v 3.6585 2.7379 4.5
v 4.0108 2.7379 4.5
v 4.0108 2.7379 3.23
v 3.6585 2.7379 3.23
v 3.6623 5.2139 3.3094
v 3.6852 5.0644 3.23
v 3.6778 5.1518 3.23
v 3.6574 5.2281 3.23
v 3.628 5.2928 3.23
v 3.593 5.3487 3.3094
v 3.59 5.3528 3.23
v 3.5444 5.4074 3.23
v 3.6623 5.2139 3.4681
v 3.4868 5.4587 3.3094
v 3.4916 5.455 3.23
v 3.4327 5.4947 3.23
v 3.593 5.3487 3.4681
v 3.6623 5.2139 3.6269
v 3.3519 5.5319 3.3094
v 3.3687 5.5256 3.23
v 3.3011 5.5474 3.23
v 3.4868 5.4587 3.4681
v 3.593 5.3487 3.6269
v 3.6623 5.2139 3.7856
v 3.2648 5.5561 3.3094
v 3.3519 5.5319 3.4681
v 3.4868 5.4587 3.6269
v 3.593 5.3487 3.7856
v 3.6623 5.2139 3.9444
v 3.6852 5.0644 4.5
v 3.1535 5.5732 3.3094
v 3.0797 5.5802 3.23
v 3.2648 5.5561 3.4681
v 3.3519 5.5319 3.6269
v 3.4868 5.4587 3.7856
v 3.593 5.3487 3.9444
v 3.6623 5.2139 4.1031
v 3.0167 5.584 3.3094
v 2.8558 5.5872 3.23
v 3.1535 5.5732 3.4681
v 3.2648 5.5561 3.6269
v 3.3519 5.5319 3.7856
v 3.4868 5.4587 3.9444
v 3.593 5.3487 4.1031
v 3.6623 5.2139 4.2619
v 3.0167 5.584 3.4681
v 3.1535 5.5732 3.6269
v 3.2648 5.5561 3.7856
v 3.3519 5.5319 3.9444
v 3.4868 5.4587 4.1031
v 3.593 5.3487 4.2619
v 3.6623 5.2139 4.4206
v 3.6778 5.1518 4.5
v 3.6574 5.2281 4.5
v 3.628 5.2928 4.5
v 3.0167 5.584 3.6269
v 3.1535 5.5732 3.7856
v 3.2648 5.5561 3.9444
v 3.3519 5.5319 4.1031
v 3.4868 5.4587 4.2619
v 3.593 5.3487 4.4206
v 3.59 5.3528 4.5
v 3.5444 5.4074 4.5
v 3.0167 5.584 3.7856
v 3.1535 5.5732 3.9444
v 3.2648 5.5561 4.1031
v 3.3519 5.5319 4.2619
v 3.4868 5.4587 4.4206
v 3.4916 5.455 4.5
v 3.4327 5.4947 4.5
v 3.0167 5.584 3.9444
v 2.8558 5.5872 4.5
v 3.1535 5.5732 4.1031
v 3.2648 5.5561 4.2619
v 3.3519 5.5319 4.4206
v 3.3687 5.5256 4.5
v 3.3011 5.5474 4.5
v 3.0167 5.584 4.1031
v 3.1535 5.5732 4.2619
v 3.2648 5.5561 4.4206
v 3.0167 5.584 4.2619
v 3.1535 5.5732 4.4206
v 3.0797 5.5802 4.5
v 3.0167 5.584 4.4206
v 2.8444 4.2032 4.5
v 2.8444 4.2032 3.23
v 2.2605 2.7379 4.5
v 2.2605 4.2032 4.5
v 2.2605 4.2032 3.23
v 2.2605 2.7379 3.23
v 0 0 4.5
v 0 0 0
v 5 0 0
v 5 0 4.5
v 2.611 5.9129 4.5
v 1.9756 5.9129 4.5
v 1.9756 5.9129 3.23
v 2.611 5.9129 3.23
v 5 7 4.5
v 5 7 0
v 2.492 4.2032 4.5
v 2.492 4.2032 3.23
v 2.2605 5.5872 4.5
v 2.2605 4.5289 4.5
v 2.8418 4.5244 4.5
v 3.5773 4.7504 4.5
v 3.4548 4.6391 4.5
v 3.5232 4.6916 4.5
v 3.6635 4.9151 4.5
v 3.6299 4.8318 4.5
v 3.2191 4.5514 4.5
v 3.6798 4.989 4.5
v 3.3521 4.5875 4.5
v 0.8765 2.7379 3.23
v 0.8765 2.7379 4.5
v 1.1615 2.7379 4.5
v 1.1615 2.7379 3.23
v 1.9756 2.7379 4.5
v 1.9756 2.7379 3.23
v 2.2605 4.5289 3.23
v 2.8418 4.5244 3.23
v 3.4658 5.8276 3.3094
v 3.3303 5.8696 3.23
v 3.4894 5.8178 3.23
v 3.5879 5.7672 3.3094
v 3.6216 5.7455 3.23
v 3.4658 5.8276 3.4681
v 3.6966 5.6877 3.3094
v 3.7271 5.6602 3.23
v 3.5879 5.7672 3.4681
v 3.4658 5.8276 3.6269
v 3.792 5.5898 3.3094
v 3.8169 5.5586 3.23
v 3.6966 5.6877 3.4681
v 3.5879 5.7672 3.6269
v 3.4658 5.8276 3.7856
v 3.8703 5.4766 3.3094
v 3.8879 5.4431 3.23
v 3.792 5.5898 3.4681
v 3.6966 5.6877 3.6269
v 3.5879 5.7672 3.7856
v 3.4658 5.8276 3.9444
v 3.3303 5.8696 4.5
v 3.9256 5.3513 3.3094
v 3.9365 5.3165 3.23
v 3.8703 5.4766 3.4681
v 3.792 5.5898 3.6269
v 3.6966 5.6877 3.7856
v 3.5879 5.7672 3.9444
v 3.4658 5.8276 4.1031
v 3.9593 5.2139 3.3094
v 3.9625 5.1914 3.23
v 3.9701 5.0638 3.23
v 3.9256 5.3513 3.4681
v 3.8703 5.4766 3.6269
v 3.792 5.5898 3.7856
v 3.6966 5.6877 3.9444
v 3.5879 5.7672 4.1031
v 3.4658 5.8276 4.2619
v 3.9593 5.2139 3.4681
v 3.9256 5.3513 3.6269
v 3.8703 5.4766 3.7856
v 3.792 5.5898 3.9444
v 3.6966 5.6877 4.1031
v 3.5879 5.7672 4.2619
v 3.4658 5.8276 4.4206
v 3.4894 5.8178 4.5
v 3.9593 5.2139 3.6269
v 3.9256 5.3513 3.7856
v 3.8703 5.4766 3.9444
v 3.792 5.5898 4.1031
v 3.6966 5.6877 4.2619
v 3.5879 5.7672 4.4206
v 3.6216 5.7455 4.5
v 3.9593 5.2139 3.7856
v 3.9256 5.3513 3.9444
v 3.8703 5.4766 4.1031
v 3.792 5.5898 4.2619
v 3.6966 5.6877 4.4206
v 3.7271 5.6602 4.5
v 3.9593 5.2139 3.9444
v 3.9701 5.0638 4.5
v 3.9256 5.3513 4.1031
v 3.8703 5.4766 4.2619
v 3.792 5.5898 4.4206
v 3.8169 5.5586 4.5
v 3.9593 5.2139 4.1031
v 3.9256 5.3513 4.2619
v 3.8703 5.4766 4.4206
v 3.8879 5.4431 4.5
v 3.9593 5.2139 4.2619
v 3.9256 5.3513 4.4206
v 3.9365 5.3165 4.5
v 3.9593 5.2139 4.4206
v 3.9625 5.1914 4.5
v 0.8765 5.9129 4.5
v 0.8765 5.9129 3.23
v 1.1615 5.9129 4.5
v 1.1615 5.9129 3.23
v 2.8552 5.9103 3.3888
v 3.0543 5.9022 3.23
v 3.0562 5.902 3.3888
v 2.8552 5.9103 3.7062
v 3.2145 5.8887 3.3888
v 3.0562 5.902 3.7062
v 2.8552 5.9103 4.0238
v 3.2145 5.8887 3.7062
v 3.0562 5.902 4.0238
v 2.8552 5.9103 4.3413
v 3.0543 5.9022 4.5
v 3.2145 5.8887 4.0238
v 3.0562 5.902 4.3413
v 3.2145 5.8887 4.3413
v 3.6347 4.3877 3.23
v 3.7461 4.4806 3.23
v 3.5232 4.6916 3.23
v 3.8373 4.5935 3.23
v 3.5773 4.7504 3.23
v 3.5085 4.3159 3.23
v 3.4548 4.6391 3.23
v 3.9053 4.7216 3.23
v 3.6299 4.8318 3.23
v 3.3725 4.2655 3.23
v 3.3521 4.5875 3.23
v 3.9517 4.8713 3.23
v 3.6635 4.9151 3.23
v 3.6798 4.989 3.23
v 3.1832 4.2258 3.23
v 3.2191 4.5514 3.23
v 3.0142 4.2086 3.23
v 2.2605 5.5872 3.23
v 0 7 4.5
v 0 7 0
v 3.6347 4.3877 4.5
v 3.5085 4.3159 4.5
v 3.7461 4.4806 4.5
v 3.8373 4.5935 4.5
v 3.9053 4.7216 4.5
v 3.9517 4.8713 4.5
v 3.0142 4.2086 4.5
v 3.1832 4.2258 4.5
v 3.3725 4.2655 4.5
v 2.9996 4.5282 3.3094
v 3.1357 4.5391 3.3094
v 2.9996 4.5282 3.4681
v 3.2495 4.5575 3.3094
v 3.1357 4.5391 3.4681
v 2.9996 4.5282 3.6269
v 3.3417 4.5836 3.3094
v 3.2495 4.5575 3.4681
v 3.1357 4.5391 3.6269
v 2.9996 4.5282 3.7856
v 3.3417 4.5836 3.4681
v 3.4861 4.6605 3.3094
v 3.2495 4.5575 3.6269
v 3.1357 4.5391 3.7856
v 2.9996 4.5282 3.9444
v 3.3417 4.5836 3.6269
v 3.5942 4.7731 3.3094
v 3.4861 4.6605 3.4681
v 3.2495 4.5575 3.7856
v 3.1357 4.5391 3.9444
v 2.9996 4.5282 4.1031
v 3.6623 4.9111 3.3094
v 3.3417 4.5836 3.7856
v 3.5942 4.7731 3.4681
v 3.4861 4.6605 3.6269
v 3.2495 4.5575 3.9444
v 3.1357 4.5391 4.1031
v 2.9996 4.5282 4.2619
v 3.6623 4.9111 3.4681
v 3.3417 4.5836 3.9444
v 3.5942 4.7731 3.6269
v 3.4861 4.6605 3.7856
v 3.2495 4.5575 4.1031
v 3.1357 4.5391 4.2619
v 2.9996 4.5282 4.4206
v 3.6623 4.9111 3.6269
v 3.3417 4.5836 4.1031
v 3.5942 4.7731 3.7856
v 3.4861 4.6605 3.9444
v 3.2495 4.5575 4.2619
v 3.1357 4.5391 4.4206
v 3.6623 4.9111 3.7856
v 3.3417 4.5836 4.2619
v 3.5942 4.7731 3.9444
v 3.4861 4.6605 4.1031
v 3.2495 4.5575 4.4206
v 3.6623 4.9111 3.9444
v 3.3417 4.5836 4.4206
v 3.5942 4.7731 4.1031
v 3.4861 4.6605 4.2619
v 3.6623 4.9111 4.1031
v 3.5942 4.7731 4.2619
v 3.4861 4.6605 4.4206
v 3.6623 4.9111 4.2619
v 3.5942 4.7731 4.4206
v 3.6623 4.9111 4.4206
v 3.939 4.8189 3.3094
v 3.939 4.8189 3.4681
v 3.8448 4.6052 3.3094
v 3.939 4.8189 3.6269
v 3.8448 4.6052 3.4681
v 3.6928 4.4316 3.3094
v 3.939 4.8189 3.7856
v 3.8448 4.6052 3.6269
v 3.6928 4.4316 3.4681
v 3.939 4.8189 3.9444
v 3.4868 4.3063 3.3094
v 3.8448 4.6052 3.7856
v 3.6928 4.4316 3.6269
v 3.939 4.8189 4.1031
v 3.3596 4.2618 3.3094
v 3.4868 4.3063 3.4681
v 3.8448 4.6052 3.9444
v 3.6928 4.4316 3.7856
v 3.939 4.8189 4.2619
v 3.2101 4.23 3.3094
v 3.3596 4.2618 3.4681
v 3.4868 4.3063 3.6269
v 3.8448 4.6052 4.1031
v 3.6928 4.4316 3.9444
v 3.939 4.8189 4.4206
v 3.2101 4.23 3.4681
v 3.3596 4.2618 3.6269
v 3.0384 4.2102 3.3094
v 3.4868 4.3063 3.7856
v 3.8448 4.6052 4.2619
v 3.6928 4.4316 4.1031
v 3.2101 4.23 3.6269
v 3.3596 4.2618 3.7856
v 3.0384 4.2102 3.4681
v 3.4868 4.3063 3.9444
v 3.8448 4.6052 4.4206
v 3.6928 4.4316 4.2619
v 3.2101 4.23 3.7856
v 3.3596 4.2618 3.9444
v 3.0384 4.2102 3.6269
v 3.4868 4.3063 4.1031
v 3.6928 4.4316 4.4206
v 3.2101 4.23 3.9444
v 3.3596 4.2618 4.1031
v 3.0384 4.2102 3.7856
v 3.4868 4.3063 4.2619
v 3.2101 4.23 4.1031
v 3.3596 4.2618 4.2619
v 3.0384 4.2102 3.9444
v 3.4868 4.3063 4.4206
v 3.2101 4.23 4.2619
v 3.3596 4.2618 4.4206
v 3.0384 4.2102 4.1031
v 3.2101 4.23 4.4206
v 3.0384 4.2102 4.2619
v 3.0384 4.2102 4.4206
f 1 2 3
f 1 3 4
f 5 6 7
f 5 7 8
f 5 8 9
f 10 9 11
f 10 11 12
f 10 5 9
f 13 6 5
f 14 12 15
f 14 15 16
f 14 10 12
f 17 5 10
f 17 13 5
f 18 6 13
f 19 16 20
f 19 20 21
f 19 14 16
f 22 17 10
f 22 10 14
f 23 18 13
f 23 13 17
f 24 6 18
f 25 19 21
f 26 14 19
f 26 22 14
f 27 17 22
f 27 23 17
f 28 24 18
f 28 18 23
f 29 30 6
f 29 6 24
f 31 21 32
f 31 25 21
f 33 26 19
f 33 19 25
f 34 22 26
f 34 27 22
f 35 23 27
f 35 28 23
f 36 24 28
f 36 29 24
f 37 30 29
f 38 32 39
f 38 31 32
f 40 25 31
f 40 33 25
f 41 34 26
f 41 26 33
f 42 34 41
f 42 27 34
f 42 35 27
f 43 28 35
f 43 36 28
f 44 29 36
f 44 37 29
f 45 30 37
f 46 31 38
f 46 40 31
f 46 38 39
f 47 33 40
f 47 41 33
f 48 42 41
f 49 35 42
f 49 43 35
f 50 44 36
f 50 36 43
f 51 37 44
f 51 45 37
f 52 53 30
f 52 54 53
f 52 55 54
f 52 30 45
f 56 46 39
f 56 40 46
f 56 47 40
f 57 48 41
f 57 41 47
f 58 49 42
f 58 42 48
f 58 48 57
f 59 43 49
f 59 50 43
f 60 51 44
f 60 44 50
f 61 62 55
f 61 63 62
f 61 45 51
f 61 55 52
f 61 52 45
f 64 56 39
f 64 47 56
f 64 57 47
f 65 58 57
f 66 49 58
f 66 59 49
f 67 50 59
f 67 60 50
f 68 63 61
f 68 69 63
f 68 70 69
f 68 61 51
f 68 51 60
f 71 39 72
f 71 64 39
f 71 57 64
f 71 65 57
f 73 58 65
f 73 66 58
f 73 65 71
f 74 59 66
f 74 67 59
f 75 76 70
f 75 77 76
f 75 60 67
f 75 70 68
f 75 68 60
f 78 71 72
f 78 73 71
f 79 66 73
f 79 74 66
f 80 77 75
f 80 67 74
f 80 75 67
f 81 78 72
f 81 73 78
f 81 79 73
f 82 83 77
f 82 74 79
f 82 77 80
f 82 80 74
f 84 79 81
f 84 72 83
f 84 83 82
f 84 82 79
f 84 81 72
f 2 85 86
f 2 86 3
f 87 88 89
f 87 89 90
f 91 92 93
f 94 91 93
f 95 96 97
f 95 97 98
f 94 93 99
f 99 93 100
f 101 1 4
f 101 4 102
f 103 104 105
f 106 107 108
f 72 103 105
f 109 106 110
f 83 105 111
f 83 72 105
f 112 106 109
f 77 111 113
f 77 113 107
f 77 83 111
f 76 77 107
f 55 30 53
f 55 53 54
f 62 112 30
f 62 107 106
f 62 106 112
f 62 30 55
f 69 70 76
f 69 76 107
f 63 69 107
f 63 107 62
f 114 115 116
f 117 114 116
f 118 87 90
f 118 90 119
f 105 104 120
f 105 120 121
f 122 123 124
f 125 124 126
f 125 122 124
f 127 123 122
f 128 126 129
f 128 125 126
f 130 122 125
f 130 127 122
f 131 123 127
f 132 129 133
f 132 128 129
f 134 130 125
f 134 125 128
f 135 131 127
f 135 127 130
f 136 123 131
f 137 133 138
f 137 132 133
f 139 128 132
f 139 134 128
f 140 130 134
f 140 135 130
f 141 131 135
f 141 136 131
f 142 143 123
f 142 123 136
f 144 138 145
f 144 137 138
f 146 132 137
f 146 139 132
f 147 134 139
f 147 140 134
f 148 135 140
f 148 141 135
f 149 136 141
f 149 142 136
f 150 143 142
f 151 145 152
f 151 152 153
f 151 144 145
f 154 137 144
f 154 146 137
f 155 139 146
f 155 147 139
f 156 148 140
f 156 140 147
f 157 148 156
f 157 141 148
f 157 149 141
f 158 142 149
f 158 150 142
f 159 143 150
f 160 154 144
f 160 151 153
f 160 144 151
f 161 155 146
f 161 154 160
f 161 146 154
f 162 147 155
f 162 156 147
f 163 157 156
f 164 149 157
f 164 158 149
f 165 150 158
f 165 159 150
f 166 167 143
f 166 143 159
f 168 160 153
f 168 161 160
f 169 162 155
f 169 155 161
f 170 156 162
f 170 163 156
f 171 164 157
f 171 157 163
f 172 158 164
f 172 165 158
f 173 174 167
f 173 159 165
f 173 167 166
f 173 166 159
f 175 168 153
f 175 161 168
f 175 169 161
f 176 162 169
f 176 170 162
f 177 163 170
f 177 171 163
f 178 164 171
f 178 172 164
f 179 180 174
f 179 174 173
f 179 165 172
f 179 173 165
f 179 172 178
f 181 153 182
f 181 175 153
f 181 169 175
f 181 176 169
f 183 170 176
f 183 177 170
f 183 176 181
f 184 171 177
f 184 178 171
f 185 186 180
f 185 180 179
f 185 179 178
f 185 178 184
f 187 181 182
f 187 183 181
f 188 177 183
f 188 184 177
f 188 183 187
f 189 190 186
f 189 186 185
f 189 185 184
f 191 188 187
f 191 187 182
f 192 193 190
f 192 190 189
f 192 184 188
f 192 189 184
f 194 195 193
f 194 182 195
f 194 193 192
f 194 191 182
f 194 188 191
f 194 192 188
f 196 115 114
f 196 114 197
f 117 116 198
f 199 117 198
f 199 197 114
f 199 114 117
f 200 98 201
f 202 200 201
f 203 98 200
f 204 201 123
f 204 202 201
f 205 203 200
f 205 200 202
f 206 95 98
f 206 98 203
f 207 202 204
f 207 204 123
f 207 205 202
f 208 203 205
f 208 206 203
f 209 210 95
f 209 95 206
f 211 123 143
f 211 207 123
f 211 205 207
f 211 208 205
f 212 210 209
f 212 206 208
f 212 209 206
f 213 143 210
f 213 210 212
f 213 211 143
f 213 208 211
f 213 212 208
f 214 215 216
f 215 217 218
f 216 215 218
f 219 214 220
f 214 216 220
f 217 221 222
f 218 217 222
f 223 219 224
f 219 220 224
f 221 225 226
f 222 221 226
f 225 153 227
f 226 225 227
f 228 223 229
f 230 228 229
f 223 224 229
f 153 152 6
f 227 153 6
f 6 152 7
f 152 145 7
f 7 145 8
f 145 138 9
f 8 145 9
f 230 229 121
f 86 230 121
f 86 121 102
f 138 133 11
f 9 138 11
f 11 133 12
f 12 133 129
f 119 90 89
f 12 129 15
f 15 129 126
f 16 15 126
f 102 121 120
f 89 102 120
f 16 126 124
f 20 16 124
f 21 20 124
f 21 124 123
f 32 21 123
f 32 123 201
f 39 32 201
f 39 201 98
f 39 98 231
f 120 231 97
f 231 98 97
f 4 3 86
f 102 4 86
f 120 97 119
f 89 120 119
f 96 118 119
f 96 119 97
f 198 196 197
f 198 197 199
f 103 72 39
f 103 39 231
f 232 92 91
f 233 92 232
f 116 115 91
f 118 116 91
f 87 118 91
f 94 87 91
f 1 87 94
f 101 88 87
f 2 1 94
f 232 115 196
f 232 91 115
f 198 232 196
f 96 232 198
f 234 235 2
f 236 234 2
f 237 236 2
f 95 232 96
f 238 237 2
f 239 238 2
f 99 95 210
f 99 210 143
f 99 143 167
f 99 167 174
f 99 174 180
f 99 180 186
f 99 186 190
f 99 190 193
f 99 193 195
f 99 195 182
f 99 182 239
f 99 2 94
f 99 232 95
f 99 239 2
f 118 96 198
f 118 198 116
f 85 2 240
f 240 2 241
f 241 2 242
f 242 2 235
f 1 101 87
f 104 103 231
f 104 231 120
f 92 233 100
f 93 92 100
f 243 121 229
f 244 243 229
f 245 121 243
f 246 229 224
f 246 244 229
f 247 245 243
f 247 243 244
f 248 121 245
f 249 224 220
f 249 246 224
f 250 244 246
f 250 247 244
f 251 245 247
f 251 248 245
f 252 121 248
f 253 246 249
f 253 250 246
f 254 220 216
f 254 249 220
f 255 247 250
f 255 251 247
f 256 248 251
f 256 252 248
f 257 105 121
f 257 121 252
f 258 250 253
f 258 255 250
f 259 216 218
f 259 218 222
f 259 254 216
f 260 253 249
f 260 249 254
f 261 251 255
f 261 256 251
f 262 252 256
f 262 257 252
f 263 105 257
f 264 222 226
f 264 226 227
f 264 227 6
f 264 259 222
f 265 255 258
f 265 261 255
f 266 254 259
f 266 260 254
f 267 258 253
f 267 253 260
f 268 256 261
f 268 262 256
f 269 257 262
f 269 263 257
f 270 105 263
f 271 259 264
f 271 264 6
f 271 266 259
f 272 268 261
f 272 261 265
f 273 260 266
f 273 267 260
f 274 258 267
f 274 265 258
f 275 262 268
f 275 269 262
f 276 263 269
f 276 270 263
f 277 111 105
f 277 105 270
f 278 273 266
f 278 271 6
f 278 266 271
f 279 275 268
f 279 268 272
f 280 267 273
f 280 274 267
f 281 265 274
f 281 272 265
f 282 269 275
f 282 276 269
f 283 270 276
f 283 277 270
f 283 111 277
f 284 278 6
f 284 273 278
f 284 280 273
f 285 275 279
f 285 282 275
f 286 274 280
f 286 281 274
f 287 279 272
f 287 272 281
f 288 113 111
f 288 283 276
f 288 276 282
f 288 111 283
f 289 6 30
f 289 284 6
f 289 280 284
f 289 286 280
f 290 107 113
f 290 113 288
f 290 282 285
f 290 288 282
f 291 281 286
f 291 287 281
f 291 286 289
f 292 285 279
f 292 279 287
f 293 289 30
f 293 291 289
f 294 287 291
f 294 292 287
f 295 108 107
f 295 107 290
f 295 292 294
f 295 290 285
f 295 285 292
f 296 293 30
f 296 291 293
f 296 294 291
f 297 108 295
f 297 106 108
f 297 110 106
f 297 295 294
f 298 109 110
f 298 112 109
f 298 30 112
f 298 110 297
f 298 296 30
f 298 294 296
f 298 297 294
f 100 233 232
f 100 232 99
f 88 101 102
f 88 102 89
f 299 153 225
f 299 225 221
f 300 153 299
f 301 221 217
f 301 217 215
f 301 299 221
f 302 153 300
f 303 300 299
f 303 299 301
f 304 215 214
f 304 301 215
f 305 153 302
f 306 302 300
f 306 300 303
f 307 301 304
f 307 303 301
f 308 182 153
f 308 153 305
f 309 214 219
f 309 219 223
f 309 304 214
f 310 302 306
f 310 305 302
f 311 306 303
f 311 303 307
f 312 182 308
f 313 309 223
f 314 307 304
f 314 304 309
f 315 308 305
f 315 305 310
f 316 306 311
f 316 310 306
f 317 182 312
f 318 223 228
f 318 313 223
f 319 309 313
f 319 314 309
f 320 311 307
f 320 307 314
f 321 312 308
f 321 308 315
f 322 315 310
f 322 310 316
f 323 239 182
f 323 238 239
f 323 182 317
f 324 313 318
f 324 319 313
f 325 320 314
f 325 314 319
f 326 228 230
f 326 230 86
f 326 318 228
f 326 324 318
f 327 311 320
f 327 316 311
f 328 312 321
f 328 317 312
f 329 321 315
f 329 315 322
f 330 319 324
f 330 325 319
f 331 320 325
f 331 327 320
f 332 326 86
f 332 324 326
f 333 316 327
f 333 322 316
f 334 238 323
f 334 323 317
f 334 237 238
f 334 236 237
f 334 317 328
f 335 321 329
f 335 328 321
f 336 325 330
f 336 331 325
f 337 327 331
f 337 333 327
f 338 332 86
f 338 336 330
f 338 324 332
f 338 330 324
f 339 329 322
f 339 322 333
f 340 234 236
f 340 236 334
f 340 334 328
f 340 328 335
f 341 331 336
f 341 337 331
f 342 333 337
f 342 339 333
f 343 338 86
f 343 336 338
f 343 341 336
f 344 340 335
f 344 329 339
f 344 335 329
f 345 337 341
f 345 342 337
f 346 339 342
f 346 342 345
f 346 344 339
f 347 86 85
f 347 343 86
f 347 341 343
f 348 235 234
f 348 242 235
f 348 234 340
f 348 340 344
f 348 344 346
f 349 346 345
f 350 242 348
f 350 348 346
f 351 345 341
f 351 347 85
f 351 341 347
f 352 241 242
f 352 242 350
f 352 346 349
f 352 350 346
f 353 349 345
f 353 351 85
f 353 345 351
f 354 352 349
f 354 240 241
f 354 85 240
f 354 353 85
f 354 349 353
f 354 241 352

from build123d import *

# Parameters (mm, degrees)
SKETCH1_W           = 5
SKETCH1_H           = 7
BOSS_EXTRUDE1_DEPTH = 4.5
SKETCH2_W           = 0.284935897
SKETCH2_H           = 3.175
CUT_EXTRUDE1_DEPTH  = 1.27


with BuildPart() as part:
    # Sketch1 → Boss-Extrude1 (new body)
    with BuildSketch(Plane.XY):
        with Locations((2.5, 3.5)):
            Rectangle(SKETCH1_W, SKETCH1_H)
    extrude(amount=BOSS_EXTRUDE1_DEPTH)

    # Sketch2 → Cut-Extrude1 (cut)
    # profile 1 of 2: a face of its own
    with BuildSketch(Plane.XY.offset(4.5)):
        with Locations((1.019007648, 4.325358418)):
            Rectangle(SKETCH2_W, SKETCH2_H)
    # profile 2 of 2: a face of its own
    with BuildSketch(Plane.XY.offset(4.5)):
        with BuildLine():
            Line((1.97557816, 5.912858418), (2.610959771, 5.912858418))
            add(Edge.make_bspline(
                [(2.610959771, 5.912858418), (2.653360651, 5.91271728), (2.73477504, 5.912446278), (2.851409363, 5.910935193), (2.95738823, 5.90660417), (3.052656227, 5.902877098), (3.137211607, 5.896080837), (3.211313649, 5.889585107), (3.274621061, 5.881081858), (3.312944083, 5.873184795), (3.330295708, 5.86960922)],
                knots=[0, 0, 0, 0, 1.410062039, 2.707475311, 3.878576406, 4.937260626, 5.877586885, 6.699081471, 7.410979367, 8, 8, 8, 8], degree=3))
            add(Edge.make_bspline(
                [(3.330295708, 5.86960922), (3.353524574, 5.86386994), (3.399486772, 5.852513814), (3.465662903, 5.828511176), (3.528722326, 5.800734802), (3.588403095, 5.76811057), (3.644406277, 5.730396306), (3.697309316, 5.688243081), (3.747352272, 5.641881544), (3.792511322, 5.590142795), (3.835091748, 5.535862532), (3.871004287, 5.477166982), (3.90196188, 5.41578831), (3.92660942, 5.351102296), (3.946455868, 5.28373626), (3.96044967, 5.213079994), (3.968841819, 5.139455395), (3.969696217, 5.089237864), (3.970129442, 5.063774885)],
                knots=[0, 0, 0, 0, 1.027469482, 2.033020251, 3.019912614, 3.986113645, 4.951240523, 5.91722682, 6.890402269, 7.87763091, 8.8651537, 9.85103654, 10.82876324, 11.815024772, 12.821070561, 13.842952187, 14.906261191, 16, 16, 16, 16], degree=3))
            add(Edge.make_bspline(
                [(3.970129442, 5.063774885), (3.968796851, 5.021470183), (3.96619662, 4.938922752), (3.941953134, 4.819124667), (3.902241576, 4.70737436), (3.847519736, 4.603812538), (3.777833497, 4.510457881), (3.694081722, 4.428460825), (3.596217689, 4.359844619), (3.505113952, 4.312262432), (3.4246375, 4.281788865), (3.358385852, 4.260347311), (3.286116522, 4.243781099), (3.20852194, 4.228940123), (3.125279195, 4.217735371), (3.036587802, 4.209528818), (2.942384508, 4.204399788), (2.877669781, 4.203635969), (2.84437824, 4.203243034)],
                knots=[0, 0, 0, 0, 1.260483769, 2.459530307, 3.627416485, 4.787058657, 5.939039949, 7.08810263, 8.267026773, 9.491475466, 10.141966685, 10.831826277, 11.566392101, 12.351337768, 13.187381173, 14.07005841, 15.007169909, 16, 16, 16, 16], degree=3))
            Line((2.84437824, 4.203243034), (4.01083457, 2.737858418))
            Line((4.01083457, 2.737858418), (3.658480804, 2.737858418))
            Line((3.658480804, 2.737858418), (2.492024474, 4.203243034))
            Line((2.492024474, 4.203243034), (2.260514057, 4.203243034))
            Line((2.260514057, 4.203243034), (2.260514057, 2.737858418))
            Line((2.260514057, 2.737858418), (1.97557816, 2.737858418))
            Line((1.97557816, 2.737858418), (1.97557816, 5.912858418))
        make_face()
        with BuildLine():
            Line((2.260514057, 5.587217393), (2.260514057, 4.528884059))
            Line((2.260514057, 4.528884059), (2.84183417, 4.524431936))
            add(Edge.make_bspline(
                [(2.84183417, 4.524431936), (2.868975919, 4.524419928), (2.92158436, 4.524396654), (2.997694249, 4.52801958), (3.06856035, 4.532141019), (3.133911604, 4.538445068), (3.193777205, 4.546569504), (3.24812723, 4.556732211), (3.297050398, 4.568572297), (3.354108358, 4.586898057), (3.417822926, 4.615932088), (3.487066464, 4.658173648), (3.546032871, 4.711304206), (3.595851217, 4.772058698), (3.635882916, 4.838857295), (3.664105994, 4.910899287), (3.682015209, 4.986365951), (3.684127532, 5.038234663), (3.685193545, 5.064410902)],
                knots=[0, 0, 0, 0, 1.146690395, 2.22261258, 3.21895312, 4.145990853, 4.996080663, 5.770904154, 6.481378293, 7.121626537, 8.300444488, 9.431385265, 10.535395872, 11.636531494, 12.74115979, 13.810798291, 14.895190096, 16, 16, 16, 16], degree=3))
            add(Edge.make_bspline(
                [(3.685193545, 5.064410902), (3.684103049, 5.089943866), (3.681942085, 5.140540882), (3.664299273, 5.214614458), (3.634463906, 5.284525191), (3.594257304, 5.349988688), (3.545272357, 5.409411749), (3.487834055, 5.460254523), (3.423512914, 5.502209395), (3.36339547, 5.52901944), (3.309661577, 5.545456735), (3.263007528, 5.557023863), (3.210292116, 5.566317059), (3.151259379, 5.573762943), (3.086161328, 5.580162785), (3.014668809, 5.584473328), (2.937256158, 5.587025904), (2.883601442, 5.587152078), (2.855826557, 5.587217393)],
                knots=[0, 0, 0, 0, 1.101028733, 2.181837193, 3.264309656, 4.369019818, 5.486613113, 6.575447106, 7.666700264, 8.788928104, 9.402425223, 10.0903467, 10.862060571, 11.710948788, 12.657782767, 13.684531032, 14.801375019, 16, 16, 16, 16], degree=3))
            Line((2.855826557, 5.587217393), (2.260514057, 5.587217393))
        make_face(mode=Mode.SUBTRACT)
    extrude(amount=-CUT_EXTRUDE1_DEPTH, mode=Mode.SUBTRACT)


solid = part.part
